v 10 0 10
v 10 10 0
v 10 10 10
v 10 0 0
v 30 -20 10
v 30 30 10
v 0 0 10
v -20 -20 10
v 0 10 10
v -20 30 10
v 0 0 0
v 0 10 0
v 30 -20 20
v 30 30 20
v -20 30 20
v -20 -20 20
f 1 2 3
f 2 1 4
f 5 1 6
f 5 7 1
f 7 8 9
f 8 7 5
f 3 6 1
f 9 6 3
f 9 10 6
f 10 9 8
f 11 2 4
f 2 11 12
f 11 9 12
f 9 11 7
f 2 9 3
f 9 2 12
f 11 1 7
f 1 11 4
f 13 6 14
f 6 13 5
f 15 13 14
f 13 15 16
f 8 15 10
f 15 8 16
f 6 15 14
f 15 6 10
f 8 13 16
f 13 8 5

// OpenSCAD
cube([10,10,10]);
translate([-20,-20,10]) {
	cube([50,50,10]);
}
